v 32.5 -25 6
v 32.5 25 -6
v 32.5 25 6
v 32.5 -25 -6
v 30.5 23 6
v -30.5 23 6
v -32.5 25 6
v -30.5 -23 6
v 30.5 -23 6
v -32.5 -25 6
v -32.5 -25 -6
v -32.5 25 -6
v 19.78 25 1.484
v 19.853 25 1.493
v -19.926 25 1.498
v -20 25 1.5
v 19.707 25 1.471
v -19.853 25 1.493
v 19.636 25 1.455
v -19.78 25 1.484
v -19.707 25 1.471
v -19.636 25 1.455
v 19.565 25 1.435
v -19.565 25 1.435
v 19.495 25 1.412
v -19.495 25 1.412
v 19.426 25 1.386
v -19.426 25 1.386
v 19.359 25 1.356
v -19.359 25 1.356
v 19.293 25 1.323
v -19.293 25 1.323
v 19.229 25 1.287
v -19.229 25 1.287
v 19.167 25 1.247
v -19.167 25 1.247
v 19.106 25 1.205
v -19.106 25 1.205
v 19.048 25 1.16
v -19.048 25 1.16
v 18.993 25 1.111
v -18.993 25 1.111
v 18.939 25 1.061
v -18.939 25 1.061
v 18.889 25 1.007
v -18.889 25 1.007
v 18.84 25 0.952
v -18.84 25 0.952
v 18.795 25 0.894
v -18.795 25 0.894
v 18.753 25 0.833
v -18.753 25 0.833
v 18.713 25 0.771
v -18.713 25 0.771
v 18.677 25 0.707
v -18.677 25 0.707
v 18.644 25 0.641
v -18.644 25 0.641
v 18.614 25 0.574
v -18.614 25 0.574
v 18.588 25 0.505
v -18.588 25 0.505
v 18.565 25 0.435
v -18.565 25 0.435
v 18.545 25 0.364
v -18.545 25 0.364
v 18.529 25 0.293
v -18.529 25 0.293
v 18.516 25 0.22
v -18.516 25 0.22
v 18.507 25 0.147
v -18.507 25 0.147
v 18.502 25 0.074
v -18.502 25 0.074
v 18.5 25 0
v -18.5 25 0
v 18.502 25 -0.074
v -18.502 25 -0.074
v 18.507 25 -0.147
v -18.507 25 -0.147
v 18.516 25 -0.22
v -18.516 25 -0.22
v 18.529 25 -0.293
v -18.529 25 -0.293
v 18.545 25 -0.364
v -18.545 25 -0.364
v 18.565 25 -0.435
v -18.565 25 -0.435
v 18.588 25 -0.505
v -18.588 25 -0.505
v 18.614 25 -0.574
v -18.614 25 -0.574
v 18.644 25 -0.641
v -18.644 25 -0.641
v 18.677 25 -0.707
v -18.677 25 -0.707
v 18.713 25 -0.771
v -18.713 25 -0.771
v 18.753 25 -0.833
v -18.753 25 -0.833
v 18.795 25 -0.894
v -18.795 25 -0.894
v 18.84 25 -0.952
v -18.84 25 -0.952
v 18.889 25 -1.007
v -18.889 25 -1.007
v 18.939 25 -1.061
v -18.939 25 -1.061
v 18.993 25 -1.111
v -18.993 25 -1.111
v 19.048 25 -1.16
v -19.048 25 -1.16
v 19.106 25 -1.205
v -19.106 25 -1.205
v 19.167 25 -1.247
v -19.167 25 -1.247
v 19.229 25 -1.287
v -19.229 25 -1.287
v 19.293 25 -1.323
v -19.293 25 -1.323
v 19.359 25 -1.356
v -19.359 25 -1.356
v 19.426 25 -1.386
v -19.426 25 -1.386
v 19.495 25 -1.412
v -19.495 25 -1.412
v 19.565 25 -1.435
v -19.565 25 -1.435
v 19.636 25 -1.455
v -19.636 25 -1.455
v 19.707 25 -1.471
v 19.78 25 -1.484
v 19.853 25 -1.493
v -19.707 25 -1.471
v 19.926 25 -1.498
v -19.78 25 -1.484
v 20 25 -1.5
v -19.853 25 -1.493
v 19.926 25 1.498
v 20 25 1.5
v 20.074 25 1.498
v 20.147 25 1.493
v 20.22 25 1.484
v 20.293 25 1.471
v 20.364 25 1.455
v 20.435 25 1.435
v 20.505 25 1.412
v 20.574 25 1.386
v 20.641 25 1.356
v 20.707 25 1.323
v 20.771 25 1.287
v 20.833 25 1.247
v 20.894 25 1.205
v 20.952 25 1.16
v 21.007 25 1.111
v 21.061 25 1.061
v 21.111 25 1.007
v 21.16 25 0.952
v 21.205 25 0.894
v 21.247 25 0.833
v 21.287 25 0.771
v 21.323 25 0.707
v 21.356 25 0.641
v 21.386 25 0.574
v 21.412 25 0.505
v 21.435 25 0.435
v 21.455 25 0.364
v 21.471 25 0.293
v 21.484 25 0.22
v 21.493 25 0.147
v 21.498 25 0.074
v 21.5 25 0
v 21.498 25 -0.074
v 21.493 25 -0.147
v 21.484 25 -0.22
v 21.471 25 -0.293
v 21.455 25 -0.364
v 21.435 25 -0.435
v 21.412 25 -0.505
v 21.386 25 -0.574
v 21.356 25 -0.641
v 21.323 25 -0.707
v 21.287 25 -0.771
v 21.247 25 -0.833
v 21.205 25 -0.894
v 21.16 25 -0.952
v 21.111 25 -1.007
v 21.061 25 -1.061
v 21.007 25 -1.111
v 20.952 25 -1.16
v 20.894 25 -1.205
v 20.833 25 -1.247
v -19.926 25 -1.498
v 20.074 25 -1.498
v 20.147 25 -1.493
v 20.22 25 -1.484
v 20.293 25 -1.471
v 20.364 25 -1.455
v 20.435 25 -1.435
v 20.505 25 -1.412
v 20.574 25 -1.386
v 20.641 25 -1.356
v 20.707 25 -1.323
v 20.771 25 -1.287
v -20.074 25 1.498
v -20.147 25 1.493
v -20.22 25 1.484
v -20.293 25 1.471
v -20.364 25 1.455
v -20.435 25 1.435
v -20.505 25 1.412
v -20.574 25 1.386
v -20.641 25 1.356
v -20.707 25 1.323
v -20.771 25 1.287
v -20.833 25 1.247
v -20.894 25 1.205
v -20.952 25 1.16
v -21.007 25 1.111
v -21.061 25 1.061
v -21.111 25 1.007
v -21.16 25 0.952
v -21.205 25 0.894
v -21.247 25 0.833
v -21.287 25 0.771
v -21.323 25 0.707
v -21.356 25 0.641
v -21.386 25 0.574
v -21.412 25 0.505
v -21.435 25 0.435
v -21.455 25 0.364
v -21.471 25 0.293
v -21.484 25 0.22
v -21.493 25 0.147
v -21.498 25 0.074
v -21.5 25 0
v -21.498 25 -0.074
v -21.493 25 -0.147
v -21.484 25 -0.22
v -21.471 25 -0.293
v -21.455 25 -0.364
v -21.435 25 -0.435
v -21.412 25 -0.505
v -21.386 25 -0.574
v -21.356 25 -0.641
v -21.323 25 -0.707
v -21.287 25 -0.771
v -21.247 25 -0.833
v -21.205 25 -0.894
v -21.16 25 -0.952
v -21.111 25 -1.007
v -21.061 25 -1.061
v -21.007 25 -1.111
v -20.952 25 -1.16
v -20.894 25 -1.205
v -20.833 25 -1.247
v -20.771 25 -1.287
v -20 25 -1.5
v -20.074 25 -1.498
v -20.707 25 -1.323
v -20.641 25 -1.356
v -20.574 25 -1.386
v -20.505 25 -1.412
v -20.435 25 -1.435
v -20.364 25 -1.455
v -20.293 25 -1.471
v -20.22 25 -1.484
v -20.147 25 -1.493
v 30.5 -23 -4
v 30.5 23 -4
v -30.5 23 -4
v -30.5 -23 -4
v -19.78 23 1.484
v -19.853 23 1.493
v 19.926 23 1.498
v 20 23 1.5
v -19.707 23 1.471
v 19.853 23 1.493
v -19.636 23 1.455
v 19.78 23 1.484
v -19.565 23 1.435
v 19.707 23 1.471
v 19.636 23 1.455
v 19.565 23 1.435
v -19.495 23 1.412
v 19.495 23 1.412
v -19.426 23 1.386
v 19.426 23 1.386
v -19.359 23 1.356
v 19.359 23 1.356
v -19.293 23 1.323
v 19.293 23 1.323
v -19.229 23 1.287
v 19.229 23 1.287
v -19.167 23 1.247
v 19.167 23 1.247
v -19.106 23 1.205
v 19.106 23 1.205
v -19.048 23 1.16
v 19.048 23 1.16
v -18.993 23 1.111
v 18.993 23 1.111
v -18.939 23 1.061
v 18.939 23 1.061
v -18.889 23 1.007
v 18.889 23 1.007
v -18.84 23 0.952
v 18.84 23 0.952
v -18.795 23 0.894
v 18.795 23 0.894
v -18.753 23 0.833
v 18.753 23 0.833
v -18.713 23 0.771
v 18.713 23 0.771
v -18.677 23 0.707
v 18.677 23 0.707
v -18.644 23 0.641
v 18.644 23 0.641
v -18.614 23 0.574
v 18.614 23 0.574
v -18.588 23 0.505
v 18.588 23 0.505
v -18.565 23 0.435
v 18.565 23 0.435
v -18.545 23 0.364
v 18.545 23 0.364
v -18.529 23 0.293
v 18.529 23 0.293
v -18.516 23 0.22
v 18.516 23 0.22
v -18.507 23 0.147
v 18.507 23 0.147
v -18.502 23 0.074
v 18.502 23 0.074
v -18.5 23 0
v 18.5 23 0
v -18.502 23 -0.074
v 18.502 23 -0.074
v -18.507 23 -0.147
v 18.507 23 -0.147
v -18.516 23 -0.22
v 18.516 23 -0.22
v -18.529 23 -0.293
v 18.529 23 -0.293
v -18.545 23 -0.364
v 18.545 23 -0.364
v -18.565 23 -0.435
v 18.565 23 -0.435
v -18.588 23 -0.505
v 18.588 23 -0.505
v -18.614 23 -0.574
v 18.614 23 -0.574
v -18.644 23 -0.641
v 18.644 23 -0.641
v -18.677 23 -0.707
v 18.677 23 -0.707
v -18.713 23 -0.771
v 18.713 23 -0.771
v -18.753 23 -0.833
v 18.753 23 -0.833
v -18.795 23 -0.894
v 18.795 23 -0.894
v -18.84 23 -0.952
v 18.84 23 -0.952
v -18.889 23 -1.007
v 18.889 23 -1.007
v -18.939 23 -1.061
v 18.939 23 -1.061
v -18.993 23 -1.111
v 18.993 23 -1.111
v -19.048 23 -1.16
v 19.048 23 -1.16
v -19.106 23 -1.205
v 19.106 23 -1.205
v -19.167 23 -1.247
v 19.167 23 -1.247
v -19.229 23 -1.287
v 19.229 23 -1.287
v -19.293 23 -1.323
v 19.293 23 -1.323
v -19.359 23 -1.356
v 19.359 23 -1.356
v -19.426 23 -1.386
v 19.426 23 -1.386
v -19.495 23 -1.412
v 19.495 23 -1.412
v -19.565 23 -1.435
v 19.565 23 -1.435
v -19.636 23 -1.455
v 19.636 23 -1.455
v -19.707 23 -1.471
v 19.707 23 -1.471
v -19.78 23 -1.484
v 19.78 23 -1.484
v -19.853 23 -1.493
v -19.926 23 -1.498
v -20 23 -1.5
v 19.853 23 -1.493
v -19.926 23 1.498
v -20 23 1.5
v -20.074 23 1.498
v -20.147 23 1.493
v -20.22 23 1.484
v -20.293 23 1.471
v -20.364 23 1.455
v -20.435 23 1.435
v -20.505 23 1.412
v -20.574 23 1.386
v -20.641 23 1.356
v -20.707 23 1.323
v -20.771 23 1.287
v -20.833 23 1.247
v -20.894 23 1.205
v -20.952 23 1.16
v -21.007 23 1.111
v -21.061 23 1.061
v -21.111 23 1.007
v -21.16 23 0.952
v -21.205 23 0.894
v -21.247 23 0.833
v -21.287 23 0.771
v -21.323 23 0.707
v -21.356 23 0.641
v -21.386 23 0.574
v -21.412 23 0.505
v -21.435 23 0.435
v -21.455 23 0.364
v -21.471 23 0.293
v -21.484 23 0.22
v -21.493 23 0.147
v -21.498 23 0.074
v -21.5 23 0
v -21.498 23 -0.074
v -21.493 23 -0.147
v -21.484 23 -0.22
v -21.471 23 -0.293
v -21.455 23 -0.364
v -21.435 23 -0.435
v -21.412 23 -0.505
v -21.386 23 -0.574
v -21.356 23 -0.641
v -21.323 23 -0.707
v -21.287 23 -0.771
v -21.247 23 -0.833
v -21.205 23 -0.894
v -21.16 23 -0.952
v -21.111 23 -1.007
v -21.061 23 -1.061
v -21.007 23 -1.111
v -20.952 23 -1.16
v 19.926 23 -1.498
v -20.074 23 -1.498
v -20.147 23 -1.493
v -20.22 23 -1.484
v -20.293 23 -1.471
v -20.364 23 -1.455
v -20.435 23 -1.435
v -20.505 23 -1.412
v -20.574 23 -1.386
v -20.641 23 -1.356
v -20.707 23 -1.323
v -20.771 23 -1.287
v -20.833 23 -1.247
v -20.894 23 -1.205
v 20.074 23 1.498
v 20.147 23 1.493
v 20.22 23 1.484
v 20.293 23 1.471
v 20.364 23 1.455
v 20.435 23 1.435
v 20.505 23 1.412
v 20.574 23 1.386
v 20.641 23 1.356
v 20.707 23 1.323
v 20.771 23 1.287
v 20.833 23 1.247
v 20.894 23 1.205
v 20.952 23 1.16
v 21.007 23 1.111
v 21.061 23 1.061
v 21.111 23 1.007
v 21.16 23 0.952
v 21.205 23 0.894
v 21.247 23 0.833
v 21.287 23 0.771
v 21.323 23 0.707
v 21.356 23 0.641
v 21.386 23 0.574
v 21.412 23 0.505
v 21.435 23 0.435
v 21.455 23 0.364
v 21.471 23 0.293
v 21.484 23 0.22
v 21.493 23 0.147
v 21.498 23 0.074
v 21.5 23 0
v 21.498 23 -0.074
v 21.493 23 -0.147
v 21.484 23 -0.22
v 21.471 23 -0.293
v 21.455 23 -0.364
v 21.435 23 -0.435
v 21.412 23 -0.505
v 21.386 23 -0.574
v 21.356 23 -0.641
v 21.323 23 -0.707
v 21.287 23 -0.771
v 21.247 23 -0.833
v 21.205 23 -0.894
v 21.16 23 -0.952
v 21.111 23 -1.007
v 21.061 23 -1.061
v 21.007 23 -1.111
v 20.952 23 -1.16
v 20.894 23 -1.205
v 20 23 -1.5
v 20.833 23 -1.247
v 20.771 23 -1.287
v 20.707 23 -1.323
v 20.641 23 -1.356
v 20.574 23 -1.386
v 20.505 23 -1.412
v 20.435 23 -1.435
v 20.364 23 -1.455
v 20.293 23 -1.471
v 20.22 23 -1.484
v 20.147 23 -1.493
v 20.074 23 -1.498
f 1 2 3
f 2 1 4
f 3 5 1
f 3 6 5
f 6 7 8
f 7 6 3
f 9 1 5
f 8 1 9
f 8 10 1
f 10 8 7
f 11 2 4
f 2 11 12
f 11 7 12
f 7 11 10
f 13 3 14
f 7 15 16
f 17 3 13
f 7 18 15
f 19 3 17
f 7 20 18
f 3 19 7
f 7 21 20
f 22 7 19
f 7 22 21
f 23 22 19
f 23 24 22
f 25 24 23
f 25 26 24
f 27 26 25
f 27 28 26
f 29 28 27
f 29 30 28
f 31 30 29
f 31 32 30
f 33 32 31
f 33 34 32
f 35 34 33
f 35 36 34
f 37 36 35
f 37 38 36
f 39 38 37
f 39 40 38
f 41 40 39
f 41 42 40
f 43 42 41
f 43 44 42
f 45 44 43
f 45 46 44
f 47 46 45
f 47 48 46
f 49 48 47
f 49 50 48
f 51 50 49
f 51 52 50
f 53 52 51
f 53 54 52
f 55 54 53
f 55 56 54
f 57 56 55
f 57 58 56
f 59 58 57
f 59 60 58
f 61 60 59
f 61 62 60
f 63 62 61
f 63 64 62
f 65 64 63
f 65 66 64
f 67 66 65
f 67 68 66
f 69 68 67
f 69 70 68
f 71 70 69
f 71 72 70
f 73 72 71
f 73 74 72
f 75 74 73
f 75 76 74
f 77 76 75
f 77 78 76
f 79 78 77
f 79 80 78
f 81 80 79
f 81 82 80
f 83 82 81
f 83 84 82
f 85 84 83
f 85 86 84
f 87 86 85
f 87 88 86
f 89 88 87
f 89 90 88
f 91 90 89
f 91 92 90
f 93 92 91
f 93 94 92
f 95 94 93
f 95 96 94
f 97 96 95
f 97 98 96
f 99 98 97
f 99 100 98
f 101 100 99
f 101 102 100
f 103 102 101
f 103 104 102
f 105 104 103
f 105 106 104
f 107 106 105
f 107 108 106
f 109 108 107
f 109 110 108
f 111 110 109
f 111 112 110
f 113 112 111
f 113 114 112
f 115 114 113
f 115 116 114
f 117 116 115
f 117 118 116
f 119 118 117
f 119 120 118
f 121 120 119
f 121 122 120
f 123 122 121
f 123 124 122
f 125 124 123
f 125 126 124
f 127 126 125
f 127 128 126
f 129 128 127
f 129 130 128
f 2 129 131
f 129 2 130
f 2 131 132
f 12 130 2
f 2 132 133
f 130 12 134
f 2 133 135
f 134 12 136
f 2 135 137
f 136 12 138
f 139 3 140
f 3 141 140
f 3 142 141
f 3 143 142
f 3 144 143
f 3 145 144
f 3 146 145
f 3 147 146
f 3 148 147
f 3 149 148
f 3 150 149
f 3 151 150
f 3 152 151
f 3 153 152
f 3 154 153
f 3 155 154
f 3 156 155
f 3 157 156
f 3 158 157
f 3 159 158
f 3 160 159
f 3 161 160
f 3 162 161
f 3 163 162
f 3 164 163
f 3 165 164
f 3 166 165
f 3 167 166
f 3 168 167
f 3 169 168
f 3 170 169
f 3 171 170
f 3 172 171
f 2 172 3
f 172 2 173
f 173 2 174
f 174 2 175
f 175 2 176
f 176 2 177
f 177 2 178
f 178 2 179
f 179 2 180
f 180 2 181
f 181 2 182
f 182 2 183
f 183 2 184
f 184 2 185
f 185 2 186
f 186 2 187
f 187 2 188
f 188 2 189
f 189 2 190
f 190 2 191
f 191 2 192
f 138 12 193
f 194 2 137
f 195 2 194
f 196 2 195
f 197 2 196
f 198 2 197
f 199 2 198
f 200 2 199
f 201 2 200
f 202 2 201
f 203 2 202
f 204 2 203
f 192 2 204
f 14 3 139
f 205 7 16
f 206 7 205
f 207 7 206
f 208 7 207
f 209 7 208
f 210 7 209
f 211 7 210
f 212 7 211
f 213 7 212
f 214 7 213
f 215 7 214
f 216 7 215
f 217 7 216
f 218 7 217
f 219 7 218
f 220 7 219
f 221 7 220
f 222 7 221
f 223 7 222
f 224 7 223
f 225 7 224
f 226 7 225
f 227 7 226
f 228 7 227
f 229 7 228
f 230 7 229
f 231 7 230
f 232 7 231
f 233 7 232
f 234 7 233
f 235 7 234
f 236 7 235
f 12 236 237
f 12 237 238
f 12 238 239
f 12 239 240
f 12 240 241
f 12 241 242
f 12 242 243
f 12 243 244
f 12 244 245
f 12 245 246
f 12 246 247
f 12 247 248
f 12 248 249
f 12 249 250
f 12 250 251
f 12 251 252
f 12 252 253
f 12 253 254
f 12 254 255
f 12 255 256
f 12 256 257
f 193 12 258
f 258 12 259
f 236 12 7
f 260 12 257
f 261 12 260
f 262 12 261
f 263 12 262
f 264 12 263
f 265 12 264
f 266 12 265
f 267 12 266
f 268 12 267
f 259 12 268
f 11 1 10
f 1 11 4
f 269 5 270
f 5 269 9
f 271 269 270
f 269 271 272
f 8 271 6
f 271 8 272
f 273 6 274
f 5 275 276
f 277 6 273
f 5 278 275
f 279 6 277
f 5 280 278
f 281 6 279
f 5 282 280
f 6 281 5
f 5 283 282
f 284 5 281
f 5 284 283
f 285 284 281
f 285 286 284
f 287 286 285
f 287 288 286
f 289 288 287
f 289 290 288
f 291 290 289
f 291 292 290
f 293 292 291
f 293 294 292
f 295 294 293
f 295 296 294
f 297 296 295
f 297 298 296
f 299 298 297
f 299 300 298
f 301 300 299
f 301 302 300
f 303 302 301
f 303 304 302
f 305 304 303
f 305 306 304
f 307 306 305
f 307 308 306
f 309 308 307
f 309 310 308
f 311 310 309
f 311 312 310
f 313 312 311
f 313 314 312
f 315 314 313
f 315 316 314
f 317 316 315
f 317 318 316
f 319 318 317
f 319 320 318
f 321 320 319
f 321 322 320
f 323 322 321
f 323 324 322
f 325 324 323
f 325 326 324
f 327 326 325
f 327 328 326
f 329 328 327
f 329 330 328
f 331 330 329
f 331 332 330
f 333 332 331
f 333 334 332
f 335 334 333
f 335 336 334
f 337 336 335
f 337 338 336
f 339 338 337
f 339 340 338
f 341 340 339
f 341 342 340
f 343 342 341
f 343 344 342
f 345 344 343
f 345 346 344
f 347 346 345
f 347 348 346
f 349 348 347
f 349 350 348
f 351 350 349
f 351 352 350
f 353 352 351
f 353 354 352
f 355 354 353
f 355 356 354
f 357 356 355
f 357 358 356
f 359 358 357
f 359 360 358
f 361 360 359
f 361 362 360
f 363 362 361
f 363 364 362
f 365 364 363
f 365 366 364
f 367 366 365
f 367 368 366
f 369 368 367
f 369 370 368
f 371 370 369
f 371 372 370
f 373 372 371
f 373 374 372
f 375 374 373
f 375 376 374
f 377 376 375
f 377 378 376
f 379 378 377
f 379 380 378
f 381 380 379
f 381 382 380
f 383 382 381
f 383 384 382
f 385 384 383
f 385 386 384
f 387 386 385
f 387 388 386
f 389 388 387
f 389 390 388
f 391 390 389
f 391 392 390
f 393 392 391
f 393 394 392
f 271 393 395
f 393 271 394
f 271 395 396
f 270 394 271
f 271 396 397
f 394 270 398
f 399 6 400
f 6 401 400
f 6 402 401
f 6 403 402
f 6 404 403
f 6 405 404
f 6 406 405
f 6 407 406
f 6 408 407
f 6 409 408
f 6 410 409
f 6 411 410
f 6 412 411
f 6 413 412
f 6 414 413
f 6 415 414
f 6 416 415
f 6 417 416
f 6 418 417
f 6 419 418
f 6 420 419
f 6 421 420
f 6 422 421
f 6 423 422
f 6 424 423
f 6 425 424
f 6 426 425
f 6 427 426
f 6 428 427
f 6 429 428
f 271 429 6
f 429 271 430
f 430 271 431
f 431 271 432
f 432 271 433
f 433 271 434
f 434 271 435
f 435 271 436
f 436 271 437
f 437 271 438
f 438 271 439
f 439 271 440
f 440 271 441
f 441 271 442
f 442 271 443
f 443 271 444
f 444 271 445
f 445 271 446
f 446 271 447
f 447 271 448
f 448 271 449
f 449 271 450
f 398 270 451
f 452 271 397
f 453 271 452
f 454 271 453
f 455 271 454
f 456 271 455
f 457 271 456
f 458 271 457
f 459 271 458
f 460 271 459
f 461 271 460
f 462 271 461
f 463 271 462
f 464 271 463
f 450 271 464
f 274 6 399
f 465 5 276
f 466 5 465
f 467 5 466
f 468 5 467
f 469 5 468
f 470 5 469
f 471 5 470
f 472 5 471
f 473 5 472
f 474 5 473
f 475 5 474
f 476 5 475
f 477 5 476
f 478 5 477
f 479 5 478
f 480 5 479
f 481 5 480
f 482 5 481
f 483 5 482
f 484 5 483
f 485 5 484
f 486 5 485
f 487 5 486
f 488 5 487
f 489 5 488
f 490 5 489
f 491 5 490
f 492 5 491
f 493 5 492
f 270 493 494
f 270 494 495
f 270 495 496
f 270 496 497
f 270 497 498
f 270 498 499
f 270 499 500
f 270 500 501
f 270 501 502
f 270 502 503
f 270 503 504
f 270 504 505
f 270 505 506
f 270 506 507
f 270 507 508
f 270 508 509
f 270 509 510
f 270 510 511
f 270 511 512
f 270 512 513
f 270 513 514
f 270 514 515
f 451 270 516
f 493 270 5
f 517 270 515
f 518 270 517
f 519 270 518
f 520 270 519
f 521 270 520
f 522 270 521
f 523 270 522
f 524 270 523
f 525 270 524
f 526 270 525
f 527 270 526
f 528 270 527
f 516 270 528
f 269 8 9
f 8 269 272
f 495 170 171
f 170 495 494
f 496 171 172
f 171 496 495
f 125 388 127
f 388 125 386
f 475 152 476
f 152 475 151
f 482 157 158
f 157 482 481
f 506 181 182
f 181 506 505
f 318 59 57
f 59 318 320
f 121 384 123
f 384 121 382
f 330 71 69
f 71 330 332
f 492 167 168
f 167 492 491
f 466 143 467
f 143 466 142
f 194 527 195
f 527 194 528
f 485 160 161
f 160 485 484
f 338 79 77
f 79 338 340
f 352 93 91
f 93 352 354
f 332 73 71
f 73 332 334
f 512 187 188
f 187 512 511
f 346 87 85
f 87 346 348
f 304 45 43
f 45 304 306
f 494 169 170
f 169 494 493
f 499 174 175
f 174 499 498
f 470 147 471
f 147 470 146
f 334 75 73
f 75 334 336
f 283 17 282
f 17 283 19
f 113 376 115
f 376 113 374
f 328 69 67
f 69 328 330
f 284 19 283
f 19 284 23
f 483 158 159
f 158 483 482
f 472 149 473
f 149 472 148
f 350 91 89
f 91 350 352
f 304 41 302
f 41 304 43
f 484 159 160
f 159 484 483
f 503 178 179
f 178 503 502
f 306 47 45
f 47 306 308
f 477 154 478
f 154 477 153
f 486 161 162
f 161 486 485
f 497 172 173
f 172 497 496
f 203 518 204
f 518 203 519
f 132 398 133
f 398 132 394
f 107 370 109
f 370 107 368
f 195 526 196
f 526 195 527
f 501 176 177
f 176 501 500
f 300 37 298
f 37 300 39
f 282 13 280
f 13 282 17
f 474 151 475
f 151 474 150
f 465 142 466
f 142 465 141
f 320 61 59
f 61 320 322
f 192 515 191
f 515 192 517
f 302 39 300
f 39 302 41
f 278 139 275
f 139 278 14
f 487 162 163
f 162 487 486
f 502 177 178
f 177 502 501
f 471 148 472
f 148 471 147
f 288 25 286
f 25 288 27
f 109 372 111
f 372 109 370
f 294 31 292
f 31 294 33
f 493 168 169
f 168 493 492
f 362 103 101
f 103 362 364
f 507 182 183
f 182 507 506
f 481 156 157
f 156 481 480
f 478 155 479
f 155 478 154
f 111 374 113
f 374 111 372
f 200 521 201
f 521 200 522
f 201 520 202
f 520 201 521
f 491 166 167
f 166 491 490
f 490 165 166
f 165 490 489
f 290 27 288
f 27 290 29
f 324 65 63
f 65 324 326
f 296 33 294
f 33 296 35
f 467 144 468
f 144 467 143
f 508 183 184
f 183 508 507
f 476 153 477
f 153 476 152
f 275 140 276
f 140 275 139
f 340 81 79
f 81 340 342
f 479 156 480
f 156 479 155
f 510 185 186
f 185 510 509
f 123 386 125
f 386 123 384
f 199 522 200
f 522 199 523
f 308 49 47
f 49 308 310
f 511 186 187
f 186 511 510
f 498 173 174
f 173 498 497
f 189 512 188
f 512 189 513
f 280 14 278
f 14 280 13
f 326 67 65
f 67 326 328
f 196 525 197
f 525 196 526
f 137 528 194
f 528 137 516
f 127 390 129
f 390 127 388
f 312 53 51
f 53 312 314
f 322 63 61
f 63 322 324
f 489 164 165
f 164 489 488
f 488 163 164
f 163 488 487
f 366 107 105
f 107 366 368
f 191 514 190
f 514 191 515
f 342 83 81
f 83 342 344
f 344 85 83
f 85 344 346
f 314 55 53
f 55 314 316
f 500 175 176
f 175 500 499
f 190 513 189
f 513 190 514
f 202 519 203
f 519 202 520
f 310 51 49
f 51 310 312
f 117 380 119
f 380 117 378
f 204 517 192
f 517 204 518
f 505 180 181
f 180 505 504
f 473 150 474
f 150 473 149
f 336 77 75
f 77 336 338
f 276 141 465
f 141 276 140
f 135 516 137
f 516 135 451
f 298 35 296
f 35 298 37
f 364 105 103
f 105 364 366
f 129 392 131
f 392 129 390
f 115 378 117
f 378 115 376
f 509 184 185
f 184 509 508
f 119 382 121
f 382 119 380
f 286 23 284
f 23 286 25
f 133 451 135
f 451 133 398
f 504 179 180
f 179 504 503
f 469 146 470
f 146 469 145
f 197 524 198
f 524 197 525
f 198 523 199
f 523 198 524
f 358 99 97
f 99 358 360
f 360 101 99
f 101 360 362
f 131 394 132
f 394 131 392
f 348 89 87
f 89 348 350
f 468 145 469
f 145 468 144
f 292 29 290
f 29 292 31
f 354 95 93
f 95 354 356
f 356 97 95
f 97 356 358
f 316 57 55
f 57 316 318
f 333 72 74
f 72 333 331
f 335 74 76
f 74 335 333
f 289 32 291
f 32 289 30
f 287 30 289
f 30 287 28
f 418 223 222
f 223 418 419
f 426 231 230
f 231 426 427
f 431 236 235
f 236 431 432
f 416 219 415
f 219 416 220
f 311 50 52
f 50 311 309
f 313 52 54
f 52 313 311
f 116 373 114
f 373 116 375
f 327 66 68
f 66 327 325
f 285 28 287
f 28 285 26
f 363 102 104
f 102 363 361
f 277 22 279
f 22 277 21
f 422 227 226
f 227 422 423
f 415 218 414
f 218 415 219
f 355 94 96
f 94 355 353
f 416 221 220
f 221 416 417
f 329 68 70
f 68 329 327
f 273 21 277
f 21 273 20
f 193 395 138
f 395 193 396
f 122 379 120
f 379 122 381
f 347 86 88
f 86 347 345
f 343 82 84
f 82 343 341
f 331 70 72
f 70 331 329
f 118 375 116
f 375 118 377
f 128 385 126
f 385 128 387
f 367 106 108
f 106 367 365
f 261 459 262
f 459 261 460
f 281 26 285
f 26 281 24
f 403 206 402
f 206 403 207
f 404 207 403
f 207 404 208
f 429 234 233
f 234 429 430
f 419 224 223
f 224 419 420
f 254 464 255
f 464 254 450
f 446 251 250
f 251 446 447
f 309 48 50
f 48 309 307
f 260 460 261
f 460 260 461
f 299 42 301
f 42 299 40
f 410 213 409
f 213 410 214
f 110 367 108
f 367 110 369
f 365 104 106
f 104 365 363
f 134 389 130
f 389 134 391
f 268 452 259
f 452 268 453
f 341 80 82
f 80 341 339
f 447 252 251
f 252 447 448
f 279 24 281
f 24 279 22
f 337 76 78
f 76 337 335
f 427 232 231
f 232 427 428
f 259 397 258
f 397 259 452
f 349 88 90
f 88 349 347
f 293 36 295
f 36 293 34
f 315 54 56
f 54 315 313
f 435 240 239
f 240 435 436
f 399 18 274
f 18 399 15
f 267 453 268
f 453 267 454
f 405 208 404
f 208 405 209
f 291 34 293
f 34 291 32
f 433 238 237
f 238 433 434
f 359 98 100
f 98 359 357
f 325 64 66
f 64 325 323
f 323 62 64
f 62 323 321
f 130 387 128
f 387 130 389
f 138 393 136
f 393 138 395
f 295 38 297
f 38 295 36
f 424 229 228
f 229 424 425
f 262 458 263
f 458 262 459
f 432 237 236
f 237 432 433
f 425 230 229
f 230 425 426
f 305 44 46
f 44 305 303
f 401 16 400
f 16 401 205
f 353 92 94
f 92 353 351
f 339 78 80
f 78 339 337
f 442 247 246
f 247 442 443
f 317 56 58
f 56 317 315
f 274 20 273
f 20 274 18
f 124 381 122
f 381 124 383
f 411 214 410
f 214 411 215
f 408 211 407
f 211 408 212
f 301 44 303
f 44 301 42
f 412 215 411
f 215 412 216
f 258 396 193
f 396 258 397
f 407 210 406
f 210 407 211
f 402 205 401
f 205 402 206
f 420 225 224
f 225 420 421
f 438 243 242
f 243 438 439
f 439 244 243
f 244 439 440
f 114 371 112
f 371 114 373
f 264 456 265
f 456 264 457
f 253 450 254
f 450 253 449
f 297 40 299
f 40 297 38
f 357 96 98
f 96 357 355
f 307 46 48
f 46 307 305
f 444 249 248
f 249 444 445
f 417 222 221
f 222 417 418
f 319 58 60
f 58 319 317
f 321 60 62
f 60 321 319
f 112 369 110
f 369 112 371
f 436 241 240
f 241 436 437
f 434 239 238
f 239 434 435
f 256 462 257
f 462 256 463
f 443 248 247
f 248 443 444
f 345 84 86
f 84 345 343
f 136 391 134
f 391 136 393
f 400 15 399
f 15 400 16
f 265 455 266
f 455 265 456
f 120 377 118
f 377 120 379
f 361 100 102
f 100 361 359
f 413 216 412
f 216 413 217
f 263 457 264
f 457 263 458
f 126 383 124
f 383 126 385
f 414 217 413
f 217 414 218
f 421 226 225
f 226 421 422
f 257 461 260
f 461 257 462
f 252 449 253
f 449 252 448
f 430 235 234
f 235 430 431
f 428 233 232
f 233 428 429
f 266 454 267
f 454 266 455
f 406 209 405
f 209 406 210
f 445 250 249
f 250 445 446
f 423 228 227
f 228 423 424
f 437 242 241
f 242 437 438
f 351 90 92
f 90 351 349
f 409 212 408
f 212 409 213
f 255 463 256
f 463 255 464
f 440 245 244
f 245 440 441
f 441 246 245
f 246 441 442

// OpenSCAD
overlap=0.001;
$fn=128;

// trough dimensions
width=65;
wall=4;
length=50;
depth=12;

// hole dimensions
screw=3;

trough();
//outer();
//inner();

// hole();

module trough()
{
    difference()
    {
        outer(); 
        inner();
        
        translate([20,length/2,0])
        hole();
        
        translate([-20,length/2,0])
        hole();
    }

}
        

module outer()
{
    cube(size=[width,length,depth], center=true);
}

module inner()
{
    translate([0,0,wall/2])
    cube(size=[width-wall,length-wall,depth], center=true);
}

module hole()
{    
    rotate([90,0,0])
    cylinder(h=wall, d=screw);
}
